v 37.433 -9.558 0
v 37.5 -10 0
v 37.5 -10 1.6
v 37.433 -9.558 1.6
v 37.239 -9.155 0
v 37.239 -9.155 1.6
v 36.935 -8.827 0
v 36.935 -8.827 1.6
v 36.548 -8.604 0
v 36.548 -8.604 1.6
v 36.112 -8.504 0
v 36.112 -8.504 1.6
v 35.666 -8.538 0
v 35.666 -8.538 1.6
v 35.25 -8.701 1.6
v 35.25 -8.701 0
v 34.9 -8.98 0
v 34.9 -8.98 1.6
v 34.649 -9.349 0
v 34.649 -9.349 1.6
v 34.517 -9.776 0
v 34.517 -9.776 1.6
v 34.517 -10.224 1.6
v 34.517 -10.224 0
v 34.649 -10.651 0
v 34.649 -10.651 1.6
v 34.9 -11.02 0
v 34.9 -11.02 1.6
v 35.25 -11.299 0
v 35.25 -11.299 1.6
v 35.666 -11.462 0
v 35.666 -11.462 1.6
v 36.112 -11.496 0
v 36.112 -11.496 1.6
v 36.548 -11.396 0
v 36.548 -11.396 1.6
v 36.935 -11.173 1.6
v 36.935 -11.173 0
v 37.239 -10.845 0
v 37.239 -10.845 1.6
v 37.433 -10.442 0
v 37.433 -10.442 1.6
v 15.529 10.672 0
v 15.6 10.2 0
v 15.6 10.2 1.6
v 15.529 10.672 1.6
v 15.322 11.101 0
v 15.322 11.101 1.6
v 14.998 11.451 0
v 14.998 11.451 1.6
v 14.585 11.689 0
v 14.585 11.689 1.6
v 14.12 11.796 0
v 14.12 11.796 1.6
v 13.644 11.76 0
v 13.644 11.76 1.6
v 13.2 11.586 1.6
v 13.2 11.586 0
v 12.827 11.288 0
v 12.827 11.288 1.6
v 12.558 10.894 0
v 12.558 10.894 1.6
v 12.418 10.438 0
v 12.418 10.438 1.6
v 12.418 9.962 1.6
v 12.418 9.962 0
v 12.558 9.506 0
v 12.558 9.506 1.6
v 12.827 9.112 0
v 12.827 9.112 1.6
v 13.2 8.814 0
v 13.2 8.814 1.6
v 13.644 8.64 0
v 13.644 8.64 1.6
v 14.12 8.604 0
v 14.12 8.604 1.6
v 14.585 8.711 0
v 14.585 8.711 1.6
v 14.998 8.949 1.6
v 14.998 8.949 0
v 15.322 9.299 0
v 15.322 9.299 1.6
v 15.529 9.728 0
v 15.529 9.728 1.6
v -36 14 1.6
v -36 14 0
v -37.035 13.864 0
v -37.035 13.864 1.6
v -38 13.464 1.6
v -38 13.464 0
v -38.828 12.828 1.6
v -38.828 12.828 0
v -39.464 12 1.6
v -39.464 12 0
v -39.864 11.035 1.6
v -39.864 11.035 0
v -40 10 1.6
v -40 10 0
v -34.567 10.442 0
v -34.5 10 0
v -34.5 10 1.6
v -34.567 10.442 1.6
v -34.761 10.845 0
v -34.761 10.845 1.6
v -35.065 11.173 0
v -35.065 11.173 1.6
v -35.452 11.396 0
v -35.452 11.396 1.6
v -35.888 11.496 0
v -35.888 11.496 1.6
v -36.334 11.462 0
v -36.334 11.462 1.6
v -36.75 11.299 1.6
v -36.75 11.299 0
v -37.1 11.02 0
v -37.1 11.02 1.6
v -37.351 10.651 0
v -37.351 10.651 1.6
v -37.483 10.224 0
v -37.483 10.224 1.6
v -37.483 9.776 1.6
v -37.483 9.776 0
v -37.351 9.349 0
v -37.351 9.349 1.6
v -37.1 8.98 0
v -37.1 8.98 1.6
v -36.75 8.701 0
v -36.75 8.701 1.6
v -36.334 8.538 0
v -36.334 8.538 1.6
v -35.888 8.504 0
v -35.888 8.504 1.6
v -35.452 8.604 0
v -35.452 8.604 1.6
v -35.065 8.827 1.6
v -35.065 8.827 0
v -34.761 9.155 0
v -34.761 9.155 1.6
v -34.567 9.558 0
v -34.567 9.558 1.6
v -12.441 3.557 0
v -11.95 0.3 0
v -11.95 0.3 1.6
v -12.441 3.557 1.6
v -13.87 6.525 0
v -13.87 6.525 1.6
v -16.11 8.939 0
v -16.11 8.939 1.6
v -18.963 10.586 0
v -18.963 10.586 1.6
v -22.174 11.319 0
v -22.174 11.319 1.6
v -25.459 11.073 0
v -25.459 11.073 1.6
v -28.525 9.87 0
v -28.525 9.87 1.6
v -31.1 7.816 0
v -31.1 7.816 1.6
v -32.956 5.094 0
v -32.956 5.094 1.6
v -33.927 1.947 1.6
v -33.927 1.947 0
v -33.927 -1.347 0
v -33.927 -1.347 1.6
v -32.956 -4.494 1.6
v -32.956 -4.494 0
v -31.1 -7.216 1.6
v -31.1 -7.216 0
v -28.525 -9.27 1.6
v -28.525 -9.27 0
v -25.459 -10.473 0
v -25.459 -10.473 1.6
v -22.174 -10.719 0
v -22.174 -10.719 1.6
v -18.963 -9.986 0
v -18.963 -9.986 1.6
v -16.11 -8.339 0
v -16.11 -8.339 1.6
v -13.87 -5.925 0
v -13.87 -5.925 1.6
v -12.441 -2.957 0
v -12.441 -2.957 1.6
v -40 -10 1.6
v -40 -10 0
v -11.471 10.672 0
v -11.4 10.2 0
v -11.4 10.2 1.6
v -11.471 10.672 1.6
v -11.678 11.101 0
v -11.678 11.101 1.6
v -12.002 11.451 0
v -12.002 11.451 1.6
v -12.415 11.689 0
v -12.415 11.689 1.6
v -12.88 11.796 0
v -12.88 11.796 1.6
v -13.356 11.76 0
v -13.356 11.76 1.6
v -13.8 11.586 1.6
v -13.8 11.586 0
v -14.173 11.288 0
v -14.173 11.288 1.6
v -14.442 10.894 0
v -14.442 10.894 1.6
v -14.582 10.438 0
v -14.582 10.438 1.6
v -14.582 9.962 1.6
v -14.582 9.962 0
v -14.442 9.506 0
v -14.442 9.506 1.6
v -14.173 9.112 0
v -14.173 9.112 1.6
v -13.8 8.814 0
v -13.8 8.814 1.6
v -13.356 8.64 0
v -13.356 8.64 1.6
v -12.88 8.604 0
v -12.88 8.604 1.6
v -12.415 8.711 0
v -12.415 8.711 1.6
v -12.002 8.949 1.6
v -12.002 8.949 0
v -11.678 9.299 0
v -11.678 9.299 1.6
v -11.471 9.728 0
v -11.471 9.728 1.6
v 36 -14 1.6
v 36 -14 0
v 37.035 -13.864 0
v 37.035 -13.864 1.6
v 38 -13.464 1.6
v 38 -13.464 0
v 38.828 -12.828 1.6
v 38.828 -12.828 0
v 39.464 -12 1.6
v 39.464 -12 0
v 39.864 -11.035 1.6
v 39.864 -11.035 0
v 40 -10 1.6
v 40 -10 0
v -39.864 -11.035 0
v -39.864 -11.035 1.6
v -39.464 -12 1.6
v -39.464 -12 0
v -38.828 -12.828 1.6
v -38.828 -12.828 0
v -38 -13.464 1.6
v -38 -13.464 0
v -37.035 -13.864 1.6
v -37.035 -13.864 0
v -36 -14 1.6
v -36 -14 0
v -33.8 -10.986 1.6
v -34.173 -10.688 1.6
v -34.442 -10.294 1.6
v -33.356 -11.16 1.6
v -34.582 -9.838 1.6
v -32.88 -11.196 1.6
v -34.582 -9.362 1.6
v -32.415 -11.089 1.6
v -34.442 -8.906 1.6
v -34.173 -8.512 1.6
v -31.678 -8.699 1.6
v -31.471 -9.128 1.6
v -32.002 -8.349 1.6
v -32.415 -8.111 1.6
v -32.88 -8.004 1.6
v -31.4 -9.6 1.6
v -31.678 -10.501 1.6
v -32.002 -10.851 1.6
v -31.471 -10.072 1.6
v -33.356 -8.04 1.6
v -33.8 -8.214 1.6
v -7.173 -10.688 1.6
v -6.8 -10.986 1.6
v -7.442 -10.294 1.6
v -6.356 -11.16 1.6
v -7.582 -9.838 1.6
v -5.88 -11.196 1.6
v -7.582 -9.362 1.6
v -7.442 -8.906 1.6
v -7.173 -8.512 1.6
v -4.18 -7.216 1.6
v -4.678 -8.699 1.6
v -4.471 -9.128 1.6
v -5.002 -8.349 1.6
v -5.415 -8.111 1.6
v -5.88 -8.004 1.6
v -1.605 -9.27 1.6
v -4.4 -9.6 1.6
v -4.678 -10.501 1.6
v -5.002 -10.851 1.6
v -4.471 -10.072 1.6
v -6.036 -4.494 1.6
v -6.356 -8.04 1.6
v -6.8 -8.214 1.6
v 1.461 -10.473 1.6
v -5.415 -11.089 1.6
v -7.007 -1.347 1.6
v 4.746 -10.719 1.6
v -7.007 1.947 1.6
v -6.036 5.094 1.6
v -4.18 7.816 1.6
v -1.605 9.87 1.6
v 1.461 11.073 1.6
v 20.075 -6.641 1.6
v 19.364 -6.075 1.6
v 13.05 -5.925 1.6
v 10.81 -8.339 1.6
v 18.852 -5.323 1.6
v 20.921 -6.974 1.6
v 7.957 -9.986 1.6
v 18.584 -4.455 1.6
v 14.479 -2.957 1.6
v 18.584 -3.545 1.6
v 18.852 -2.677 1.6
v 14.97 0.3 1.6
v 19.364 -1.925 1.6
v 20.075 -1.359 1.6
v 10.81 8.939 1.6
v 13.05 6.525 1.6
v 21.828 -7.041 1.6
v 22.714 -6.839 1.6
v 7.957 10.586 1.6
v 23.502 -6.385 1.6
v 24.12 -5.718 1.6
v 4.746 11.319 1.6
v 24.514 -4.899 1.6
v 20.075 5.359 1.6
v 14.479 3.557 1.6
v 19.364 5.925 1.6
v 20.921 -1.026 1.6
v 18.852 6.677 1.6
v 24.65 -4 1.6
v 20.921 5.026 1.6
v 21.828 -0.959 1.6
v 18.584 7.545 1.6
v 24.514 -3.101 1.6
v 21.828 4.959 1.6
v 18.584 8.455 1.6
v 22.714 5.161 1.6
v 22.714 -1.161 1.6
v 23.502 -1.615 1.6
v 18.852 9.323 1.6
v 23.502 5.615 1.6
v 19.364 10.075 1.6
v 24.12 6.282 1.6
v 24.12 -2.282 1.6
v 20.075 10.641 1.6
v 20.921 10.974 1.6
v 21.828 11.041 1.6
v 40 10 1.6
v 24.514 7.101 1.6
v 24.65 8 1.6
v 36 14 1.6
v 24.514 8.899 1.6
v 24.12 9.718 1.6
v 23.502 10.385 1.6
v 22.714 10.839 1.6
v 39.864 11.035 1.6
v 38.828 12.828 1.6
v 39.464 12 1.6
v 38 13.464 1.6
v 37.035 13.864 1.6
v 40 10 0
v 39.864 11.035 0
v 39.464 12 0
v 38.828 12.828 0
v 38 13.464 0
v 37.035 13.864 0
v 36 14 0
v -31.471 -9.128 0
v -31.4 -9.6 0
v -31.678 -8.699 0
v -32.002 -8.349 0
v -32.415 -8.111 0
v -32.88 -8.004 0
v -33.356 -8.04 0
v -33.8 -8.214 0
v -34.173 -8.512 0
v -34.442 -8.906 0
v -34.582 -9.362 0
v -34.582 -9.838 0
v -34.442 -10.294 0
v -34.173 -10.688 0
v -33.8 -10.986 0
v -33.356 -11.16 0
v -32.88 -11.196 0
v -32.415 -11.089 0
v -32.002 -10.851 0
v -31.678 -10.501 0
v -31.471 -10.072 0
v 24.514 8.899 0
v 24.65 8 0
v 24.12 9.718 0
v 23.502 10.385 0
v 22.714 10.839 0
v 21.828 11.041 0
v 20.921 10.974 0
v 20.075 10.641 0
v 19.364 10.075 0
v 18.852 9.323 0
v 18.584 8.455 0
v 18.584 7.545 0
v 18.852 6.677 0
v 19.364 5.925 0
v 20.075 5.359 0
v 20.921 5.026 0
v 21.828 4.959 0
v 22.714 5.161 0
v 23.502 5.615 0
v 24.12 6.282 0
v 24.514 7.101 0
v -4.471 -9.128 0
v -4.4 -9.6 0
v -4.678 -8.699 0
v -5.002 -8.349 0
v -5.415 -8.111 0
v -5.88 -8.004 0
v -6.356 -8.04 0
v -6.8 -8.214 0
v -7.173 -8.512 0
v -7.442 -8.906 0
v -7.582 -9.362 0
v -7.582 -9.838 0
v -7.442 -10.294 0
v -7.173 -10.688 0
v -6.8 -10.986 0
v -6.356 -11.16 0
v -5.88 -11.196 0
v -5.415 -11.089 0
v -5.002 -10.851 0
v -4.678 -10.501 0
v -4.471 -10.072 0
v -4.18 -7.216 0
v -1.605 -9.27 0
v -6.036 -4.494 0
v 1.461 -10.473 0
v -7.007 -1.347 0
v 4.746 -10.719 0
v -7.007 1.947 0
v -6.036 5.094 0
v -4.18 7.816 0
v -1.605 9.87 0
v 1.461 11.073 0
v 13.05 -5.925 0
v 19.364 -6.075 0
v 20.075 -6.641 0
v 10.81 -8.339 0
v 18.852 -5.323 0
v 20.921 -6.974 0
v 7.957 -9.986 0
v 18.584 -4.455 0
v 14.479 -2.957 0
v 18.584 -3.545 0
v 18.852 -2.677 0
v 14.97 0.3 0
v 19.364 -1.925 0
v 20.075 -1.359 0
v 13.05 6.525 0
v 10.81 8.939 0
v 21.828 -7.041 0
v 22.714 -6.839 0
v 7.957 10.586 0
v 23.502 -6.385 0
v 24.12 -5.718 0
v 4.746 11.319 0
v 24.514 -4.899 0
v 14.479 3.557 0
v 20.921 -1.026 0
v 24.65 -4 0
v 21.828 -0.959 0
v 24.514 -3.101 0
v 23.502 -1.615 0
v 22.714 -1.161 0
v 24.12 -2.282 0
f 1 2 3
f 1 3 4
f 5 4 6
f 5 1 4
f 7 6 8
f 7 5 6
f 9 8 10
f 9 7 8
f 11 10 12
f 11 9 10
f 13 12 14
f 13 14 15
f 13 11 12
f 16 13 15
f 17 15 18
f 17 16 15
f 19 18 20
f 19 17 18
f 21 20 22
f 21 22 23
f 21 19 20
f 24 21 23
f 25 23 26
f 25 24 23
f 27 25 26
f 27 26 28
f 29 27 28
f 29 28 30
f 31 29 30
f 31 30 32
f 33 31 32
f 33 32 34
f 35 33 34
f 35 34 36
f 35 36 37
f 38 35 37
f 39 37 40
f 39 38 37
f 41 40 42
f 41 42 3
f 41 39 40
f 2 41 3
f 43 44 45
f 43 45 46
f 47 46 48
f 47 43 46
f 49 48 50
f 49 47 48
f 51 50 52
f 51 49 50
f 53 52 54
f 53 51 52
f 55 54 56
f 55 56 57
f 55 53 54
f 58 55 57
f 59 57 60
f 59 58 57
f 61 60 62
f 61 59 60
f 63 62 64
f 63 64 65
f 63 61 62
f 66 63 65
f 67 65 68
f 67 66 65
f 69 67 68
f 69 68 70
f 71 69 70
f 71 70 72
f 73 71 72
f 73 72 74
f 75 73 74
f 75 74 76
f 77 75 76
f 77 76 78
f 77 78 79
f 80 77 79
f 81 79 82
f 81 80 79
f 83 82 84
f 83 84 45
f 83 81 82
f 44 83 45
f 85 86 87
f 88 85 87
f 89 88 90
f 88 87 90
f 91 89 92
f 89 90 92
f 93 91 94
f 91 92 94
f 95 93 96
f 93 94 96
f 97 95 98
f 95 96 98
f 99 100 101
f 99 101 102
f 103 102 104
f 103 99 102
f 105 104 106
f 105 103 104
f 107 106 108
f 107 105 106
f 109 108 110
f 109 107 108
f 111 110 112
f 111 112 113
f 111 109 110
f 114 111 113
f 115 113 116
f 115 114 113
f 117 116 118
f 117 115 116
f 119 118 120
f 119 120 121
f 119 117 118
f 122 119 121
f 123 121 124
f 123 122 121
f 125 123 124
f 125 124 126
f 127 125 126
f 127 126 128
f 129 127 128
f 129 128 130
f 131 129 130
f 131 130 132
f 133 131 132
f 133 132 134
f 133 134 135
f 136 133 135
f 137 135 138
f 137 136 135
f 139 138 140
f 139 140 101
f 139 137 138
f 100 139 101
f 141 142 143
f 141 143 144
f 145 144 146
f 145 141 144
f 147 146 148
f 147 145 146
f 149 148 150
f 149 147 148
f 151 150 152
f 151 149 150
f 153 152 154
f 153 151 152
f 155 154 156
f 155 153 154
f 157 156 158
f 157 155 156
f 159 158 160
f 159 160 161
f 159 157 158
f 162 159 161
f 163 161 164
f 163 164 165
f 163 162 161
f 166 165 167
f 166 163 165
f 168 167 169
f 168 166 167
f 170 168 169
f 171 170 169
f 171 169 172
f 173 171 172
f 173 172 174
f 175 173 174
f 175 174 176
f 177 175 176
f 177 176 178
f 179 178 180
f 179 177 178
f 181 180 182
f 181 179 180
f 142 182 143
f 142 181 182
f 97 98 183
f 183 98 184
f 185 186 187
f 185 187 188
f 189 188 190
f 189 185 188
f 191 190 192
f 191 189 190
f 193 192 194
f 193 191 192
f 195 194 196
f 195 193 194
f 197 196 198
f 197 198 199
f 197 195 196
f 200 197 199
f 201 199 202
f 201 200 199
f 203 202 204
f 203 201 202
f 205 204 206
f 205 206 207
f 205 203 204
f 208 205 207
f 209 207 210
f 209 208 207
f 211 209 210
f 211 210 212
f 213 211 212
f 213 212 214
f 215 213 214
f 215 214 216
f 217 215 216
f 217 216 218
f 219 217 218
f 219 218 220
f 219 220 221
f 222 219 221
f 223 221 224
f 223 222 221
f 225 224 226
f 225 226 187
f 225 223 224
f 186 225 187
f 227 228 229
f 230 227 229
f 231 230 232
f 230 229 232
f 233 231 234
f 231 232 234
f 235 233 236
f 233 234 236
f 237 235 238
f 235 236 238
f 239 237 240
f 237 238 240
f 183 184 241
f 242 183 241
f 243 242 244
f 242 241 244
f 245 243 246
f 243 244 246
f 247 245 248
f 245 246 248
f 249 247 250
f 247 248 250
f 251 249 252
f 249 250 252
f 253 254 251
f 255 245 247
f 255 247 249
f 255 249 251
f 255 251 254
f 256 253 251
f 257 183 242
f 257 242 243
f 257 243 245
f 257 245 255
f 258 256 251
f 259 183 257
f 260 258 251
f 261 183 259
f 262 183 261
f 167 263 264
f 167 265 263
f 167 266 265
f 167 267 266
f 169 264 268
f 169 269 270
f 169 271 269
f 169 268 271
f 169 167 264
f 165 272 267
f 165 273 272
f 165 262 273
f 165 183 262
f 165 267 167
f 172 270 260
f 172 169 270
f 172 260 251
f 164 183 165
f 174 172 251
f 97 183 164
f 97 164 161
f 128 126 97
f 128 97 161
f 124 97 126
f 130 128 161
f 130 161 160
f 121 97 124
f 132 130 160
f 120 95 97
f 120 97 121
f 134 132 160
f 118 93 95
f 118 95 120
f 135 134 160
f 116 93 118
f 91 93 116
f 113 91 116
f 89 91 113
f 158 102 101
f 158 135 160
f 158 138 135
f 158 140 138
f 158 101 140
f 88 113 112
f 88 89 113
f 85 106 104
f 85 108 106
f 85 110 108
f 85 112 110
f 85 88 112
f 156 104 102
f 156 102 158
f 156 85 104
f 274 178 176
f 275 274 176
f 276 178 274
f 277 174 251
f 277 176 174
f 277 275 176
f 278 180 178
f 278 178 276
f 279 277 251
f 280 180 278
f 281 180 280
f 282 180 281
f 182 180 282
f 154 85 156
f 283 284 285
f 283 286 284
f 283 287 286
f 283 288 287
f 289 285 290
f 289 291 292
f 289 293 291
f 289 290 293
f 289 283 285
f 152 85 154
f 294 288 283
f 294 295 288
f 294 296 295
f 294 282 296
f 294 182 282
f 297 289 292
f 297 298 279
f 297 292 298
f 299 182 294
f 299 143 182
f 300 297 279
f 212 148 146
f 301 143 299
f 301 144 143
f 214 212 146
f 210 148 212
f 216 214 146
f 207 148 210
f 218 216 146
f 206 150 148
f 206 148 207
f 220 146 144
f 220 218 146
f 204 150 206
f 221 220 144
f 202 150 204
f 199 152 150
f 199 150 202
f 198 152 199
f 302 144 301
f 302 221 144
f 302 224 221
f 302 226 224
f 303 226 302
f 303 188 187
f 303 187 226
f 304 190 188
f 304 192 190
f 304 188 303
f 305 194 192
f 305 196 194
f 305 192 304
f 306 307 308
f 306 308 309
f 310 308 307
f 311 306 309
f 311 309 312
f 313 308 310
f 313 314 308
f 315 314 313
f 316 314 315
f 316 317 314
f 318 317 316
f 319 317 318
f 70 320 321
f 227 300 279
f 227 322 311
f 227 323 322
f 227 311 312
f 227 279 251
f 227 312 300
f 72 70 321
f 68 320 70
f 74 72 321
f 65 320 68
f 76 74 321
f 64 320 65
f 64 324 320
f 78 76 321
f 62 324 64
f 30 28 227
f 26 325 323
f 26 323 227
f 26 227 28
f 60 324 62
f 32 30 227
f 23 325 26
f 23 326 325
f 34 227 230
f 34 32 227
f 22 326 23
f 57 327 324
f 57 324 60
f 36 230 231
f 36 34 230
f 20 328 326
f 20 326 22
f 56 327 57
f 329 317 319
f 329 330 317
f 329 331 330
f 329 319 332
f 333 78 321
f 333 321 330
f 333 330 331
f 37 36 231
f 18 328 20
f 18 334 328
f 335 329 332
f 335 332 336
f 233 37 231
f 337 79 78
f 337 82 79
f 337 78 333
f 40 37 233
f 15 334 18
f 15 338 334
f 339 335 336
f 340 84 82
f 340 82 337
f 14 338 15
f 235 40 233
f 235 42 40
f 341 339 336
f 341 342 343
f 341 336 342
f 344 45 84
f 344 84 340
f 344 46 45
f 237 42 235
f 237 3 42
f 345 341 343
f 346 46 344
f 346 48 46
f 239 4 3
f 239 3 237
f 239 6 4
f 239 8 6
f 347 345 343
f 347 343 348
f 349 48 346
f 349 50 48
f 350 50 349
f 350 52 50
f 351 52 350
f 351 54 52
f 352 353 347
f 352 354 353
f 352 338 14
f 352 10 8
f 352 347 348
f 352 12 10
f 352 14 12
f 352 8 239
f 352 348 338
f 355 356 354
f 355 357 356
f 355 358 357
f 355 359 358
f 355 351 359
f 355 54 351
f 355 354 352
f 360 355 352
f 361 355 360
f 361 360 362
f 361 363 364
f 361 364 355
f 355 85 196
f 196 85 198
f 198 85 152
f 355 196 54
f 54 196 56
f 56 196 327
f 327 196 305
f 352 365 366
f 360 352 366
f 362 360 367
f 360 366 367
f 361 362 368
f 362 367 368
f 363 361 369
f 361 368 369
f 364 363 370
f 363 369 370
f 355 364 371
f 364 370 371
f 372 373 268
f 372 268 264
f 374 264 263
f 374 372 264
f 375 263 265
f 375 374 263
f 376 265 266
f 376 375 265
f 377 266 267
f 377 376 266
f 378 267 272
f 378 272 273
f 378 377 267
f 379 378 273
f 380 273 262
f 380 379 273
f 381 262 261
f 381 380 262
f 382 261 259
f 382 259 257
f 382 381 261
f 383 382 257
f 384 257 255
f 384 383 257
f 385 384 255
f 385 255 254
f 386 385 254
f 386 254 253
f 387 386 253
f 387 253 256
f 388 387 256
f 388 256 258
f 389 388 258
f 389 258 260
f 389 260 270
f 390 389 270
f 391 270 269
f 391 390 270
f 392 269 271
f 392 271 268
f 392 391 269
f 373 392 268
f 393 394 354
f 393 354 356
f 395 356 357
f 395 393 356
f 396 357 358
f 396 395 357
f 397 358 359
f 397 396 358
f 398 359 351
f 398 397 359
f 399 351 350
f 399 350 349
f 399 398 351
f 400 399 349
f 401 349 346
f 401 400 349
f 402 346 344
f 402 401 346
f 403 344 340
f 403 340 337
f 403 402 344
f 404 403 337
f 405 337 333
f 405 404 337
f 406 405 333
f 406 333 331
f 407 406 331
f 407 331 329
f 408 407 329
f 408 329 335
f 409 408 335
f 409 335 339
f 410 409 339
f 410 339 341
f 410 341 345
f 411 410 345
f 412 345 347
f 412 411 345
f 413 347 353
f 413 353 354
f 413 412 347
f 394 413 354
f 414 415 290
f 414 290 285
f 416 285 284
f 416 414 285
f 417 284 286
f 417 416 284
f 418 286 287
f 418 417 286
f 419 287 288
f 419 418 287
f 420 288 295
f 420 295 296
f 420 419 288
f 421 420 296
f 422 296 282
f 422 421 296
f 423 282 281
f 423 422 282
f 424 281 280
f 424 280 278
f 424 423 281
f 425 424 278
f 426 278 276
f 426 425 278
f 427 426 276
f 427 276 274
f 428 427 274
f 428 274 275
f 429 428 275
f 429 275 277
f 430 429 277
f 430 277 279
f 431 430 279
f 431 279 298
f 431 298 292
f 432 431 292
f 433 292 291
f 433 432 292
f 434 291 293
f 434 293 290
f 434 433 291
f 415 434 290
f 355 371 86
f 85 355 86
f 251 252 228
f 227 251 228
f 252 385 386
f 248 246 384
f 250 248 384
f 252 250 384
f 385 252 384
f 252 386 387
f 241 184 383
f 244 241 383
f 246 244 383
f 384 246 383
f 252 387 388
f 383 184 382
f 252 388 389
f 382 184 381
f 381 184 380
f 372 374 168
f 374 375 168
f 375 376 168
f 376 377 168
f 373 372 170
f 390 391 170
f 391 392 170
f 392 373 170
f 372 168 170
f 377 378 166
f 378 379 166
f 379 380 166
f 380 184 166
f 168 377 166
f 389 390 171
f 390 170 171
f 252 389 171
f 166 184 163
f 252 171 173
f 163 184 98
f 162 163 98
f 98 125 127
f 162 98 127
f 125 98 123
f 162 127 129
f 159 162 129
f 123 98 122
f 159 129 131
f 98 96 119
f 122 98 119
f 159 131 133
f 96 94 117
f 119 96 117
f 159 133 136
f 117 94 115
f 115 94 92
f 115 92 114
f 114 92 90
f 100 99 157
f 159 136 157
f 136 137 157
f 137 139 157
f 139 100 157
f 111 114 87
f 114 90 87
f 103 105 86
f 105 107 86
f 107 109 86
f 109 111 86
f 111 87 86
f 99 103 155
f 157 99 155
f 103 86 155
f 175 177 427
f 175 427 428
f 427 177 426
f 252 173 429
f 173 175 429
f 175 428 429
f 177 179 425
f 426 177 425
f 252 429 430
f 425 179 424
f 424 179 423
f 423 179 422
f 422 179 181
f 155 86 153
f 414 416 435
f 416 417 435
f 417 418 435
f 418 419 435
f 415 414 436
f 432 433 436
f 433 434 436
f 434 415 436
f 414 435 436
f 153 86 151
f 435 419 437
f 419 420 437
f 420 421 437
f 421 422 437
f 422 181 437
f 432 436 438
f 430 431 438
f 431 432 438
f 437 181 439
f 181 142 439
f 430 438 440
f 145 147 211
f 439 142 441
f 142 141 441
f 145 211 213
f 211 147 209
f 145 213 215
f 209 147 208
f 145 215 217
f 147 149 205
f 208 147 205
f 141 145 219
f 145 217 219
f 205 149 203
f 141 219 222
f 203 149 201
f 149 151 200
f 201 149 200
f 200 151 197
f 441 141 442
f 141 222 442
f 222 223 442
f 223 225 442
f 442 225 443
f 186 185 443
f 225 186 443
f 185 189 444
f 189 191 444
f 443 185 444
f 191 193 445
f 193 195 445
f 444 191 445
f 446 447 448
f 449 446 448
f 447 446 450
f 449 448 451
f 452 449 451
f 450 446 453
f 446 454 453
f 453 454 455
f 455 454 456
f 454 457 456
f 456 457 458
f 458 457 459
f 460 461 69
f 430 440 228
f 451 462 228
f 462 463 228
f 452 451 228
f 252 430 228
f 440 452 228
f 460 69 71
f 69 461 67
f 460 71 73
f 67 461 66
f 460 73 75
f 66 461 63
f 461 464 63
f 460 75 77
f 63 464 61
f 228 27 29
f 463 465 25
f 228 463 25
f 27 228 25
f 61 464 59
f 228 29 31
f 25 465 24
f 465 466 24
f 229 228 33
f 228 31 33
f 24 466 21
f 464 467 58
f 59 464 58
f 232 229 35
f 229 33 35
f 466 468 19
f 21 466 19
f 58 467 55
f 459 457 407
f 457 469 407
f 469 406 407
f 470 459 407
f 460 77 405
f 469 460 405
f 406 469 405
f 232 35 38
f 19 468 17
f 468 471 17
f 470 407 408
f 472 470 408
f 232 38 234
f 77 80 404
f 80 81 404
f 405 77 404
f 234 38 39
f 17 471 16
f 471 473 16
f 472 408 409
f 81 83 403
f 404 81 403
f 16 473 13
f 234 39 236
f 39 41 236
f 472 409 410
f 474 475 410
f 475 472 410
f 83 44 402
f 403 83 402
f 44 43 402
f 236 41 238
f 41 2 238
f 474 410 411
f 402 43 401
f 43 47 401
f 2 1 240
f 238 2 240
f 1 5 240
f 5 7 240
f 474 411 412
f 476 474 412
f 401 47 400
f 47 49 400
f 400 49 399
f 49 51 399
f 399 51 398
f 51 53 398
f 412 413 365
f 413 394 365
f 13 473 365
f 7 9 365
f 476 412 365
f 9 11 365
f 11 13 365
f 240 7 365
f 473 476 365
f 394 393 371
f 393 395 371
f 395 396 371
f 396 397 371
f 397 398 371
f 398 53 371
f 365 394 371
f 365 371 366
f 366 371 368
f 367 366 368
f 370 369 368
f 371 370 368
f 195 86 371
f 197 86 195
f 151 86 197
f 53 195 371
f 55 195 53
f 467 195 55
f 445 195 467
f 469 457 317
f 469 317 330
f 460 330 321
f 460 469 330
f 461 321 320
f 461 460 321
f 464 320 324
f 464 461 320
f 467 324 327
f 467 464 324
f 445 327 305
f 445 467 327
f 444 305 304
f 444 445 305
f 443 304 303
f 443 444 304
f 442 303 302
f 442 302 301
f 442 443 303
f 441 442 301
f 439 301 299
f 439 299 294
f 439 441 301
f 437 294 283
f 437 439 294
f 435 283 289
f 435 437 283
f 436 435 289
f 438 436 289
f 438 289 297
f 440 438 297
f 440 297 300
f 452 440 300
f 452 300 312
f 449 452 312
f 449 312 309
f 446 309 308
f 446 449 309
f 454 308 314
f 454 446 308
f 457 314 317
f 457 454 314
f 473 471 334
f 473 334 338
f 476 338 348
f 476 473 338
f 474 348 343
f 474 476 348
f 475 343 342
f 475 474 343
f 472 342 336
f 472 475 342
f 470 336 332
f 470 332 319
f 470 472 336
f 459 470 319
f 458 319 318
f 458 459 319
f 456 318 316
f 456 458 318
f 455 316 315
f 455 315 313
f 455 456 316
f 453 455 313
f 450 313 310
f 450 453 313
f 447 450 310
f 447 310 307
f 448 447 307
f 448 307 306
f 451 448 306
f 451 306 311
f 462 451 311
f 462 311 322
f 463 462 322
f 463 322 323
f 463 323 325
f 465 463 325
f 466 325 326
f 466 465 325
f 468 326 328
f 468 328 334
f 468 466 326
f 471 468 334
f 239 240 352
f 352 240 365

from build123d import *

# Parameters (mm, degrees)
SKETCH1_R           = 11.05
SKETCH1_R_2         = 1.6
SKETCH1_R_3         = 1.5
SKETCH1_R_4         = 3.05
BOSS_EXTRUDE1_DEPTH = 1.6


with BuildPart() as part:
    # Sketch1 → Boss-Extrude1 (new body)
    with BuildSketch(Plane.XY):
        with BuildLine():
            Line((-36, -14), (36, -14))
            ThreePointArc((36, -14), (38.828427125, -12.828427125), (40, -10))
            Line((40, -10), (40, 10))
            ThreePointArc((40, 10), (38.828427125, 12.828427125), (36, 14))
            Line((36, 14), (-36, 14))
            ThreePointArc((-36, 14), (-38.828427125, 12.828427125), (-40, 10))
            Line((-40, 10), (-40, -10))
            ThreePointArc((-40, -10), (-38.828427125, -12.828427125), (-36, -14))
        make_face()
        with Locations((-23, 0.3)):
            Circle(SKETCH1_R, mode=Mode.SUBTRACT)
        with Locations((3.92, 0.3)):
            Circle(SKETCH1_R, mode=Mode.SUBTRACT)
        with Locations((14, 10.2)):
            Circle(SKETCH1_R_2, mode=Mode.SUBTRACT)
        with Locations((-6, -9.6)):
            Circle(SKETCH1_R_2, mode=Mode.SUBTRACT)
        with Locations((-33, -9.6)):
            Circle(SKETCH1_R_2, mode=Mode.SUBTRACT)
        with Locations((-13, 10.2)):
            Circle(SKETCH1_R_2, mode=Mode.SUBTRACT)
        with Locations((-36, 10)):
            Circle(SKETCH1_R_3, mode=Mode.SUBTRACT)
        with Locations((21.6, 8)):
            Circle(SKETCH1_R_4, mode=Mode.SUBTRACT)
        with Locations((21.6, -4)):
            Circle(SKETCH1_R_4, mode=Mode.SUBTRACT)
        with Locations((36, -10)):
            Circle(SKETCH1_R_3, mode=Mode.SUBTRACT)
    extrude(amount=BOSS_EXTRUDE1_DEPTH)


solid = part.part
